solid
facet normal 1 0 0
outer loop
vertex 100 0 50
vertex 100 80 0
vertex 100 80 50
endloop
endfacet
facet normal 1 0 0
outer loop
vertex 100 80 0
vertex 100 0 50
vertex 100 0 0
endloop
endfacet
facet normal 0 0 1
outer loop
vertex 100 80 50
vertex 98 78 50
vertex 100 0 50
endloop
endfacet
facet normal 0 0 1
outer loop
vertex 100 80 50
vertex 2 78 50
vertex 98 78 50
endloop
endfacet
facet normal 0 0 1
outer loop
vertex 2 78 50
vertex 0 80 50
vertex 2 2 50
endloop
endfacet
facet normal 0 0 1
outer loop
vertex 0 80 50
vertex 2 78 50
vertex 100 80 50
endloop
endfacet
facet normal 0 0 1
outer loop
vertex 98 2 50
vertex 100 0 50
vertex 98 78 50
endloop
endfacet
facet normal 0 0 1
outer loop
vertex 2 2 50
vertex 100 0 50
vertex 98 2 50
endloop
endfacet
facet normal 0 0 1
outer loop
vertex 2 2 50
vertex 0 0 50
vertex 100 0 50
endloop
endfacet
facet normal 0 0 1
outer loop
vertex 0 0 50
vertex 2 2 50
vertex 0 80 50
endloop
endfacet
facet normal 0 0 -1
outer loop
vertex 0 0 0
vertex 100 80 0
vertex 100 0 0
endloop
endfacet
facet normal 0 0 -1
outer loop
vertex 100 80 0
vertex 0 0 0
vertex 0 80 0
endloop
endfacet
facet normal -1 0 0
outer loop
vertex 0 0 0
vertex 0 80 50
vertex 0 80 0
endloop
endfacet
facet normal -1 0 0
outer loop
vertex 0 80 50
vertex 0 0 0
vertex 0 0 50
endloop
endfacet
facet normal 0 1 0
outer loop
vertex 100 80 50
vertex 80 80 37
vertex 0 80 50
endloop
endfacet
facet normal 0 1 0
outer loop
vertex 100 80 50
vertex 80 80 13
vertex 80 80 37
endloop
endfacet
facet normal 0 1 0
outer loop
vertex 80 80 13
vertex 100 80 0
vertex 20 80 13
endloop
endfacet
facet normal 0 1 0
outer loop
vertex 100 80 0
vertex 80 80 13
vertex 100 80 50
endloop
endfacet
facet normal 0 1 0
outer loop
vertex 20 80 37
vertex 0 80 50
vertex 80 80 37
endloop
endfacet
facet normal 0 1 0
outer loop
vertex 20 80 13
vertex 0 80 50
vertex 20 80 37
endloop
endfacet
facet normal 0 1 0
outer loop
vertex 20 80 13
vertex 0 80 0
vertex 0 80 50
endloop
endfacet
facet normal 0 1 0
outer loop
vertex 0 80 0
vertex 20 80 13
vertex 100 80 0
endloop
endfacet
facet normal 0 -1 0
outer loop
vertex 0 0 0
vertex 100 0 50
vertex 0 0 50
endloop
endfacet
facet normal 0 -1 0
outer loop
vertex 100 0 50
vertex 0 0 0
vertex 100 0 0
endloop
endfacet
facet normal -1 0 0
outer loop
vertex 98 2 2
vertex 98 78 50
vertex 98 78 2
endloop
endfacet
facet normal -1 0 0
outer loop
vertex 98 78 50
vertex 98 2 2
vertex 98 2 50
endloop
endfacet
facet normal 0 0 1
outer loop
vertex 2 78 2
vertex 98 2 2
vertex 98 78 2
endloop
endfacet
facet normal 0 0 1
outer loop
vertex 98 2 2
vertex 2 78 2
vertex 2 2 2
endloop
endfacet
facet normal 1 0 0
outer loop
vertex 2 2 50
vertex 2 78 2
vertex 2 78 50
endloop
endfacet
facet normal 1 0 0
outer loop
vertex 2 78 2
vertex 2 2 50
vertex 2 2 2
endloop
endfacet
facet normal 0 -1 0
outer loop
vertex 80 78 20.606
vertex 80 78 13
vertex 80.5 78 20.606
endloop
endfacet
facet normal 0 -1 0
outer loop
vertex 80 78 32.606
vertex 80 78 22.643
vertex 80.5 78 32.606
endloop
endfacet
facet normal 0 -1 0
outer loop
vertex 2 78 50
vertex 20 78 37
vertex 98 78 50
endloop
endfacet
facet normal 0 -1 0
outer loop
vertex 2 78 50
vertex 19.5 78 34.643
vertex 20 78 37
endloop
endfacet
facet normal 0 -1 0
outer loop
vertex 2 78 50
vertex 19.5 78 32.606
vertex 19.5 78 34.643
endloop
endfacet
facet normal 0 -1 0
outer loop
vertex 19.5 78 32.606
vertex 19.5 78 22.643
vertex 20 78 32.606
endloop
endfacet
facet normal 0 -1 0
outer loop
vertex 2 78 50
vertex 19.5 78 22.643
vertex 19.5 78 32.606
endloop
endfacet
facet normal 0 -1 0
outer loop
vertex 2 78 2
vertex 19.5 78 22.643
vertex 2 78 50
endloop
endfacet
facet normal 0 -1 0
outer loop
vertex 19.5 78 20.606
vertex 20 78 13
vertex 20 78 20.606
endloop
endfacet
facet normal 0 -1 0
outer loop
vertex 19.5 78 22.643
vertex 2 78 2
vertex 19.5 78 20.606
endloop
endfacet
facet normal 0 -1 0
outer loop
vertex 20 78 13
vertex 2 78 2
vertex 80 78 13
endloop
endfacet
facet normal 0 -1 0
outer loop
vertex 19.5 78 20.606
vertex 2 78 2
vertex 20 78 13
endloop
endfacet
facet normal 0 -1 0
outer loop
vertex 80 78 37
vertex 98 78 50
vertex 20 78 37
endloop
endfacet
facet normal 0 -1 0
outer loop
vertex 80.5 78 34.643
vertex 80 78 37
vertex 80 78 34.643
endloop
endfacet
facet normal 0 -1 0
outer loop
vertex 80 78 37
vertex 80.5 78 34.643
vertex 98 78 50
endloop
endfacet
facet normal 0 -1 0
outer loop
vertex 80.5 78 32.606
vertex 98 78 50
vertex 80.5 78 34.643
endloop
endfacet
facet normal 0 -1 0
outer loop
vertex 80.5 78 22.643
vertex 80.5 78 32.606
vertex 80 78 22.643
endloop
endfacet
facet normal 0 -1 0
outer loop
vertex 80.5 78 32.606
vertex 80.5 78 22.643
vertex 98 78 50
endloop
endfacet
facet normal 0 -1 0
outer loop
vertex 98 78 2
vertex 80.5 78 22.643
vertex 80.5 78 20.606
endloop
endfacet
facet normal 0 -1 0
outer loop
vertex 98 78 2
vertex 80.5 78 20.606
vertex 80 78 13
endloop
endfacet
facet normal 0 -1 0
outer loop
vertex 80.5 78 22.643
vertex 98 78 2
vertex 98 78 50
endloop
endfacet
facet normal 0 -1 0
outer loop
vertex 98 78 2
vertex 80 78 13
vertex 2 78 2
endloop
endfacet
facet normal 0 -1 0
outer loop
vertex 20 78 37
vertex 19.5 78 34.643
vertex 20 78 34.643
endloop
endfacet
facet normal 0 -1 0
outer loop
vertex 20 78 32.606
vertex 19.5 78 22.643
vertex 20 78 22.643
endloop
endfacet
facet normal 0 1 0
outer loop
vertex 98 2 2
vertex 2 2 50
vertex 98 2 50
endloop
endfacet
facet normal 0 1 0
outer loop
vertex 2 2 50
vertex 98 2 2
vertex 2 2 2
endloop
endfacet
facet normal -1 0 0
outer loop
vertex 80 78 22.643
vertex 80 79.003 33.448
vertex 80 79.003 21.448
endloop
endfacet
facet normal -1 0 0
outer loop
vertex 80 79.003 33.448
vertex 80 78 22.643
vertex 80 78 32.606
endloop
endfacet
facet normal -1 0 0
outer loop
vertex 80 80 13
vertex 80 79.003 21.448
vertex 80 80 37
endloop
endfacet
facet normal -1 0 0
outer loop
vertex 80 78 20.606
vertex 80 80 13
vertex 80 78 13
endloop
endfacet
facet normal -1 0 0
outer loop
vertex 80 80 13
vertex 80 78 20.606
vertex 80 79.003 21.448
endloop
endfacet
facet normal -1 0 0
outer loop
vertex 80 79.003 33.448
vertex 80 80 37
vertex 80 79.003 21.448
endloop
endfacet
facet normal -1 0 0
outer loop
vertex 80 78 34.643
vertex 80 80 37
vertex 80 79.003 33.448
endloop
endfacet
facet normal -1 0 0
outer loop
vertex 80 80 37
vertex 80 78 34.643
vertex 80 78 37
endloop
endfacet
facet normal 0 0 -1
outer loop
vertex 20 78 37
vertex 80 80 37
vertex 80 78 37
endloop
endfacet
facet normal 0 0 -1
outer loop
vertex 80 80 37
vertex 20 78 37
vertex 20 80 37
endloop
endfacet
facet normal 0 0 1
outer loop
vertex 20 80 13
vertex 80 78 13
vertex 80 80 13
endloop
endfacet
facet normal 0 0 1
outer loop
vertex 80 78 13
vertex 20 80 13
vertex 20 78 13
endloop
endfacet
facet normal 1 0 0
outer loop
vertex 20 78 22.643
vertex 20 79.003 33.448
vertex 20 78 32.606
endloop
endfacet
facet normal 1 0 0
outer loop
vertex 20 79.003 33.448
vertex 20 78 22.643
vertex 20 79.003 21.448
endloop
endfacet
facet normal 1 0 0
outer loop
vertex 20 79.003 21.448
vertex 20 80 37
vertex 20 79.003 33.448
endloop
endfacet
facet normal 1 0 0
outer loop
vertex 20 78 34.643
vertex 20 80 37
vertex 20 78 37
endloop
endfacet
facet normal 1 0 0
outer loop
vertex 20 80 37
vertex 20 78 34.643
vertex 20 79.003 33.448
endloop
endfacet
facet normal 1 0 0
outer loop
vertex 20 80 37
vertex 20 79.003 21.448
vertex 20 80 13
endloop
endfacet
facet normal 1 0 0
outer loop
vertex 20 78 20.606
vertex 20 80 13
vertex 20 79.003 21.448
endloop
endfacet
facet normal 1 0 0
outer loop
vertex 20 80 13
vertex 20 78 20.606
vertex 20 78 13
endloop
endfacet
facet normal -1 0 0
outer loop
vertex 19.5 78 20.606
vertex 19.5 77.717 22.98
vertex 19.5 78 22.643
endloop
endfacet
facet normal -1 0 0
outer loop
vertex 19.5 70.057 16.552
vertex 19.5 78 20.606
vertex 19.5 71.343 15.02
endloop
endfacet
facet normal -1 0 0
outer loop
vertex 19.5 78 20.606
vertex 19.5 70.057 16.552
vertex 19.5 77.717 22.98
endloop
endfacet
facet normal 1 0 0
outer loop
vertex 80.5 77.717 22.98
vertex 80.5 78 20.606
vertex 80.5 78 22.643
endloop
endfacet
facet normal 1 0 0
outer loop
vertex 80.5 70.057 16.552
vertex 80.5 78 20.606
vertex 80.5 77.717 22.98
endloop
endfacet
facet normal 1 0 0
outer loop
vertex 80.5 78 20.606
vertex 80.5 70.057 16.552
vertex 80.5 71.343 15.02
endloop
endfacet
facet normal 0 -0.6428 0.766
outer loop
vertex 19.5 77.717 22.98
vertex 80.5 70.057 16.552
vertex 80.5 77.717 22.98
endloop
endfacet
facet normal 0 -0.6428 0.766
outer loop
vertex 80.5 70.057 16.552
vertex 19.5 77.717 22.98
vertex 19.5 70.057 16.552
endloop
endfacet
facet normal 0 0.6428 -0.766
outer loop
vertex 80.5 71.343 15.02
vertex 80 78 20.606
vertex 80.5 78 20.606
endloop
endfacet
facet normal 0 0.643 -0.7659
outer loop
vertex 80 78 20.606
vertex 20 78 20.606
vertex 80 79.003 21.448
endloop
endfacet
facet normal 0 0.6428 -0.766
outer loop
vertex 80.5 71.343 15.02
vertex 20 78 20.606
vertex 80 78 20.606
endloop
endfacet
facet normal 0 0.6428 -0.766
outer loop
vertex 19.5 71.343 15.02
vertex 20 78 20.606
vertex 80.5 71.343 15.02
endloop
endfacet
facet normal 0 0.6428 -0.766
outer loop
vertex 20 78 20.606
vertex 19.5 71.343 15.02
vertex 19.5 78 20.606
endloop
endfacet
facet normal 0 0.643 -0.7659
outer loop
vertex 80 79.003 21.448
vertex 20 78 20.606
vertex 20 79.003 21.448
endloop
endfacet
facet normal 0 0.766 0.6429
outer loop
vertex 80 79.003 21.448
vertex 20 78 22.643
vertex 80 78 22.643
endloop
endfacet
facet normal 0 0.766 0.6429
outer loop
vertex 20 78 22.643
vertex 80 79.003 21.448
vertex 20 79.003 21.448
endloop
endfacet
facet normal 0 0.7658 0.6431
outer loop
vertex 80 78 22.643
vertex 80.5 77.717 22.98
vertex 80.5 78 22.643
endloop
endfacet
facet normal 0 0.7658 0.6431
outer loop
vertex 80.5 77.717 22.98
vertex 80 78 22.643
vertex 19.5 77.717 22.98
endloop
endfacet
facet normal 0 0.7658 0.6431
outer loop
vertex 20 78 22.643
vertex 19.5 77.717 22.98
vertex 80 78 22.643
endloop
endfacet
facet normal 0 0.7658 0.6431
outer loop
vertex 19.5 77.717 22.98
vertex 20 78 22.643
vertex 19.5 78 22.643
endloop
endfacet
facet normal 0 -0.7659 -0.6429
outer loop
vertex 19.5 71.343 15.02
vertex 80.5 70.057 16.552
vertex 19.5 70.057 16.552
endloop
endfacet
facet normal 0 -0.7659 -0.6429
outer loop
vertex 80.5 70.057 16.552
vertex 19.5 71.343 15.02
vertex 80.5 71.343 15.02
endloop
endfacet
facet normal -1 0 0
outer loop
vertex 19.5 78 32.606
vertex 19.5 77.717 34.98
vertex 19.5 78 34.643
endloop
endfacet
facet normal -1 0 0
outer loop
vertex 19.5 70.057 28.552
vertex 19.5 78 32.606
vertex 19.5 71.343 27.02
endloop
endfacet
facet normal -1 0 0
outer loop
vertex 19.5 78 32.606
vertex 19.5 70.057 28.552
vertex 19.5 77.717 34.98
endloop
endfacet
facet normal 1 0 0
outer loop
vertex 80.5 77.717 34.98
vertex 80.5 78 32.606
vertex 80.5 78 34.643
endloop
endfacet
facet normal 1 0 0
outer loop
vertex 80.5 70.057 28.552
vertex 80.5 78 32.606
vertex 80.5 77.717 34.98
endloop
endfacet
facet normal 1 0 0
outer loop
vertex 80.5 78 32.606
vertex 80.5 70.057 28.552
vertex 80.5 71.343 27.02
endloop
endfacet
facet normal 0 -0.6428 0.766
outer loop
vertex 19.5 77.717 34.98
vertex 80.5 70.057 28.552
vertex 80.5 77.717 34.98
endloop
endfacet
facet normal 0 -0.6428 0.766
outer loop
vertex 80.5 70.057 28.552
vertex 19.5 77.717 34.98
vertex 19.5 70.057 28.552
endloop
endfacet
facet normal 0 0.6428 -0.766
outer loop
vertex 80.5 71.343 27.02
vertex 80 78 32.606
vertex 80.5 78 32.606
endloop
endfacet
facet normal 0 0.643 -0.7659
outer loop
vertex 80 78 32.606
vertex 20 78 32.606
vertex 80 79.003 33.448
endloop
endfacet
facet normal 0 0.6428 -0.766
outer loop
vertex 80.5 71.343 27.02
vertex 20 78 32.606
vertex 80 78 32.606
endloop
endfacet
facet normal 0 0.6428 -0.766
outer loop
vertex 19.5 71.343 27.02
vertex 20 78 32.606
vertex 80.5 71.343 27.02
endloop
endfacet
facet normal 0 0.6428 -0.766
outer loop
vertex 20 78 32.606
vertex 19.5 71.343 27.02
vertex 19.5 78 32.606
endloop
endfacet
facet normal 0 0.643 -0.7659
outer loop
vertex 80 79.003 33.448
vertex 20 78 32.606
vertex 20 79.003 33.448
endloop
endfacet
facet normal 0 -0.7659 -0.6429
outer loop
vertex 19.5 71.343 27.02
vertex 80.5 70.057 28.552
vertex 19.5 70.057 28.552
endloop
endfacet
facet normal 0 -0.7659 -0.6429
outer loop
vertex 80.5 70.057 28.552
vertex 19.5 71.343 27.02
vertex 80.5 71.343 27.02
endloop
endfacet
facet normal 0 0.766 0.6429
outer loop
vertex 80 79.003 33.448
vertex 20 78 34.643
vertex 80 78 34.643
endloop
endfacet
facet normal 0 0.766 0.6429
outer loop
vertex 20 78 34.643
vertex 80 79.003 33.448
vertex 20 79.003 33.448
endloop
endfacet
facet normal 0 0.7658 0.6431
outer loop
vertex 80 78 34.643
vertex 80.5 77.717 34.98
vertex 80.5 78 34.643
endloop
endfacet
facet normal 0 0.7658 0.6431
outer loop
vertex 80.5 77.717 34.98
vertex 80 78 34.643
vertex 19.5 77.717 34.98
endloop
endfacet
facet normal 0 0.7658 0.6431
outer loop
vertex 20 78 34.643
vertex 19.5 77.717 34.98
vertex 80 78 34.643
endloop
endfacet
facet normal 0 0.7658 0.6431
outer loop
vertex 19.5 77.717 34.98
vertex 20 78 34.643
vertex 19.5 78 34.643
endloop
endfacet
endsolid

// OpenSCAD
$fn = 32;

// ----------------------------------------------------------------------
// Vent box: louvers enclosure
// ----------------------------------------------------------------------

// --- parameters (mm) ---
box_l = 100;              // box length, X
box_w = 80;               // box width, Y
box_h = 50;               // box height, Z
wall_t = 2;               // shell wall thickness
win_l = 60;               // vent window width, X
win_h = 24;               // vent window height, Z
slat_t = 2;               // louver slat thickness
slat_d = 10;              // louver slat depth
slat_a = 40;              // louver slat angle, degrees
slat_pitch = 12;          // louver pitch
slat_yc = 74.53;          // slat centreline Y

win_z0 = (box_h - win_h) / 2;  // window lower edge Z
n_slats = 2;  // louver count
slat_z0 = win_z0 + (win_h - (n_slats - 1) * slat_pitch) / 2;

difference() {
  union() {
    difference() {
      cube([box_l, box_w, box_h]);
  translate([wall_t, wall_t, wall_t])
    cube([box_l - 2 * wall_t, box_w - 2 * wall_t, box_h]);
  translate([(box_l - win_l) / 2, box_w - wall_t - 1, win_z0])
    cube([win_l, wall_t + 2, win_h]);
    }
    for (i = [0 : n_slats - 1])
      translate([box_l / 2, slat_yc, slat_z0 + i * slat_pitch])
        rotate([slat_a, 0, 0])
          cube([win_l + 1, slat_d, slat_t], center = true);
  }
}
